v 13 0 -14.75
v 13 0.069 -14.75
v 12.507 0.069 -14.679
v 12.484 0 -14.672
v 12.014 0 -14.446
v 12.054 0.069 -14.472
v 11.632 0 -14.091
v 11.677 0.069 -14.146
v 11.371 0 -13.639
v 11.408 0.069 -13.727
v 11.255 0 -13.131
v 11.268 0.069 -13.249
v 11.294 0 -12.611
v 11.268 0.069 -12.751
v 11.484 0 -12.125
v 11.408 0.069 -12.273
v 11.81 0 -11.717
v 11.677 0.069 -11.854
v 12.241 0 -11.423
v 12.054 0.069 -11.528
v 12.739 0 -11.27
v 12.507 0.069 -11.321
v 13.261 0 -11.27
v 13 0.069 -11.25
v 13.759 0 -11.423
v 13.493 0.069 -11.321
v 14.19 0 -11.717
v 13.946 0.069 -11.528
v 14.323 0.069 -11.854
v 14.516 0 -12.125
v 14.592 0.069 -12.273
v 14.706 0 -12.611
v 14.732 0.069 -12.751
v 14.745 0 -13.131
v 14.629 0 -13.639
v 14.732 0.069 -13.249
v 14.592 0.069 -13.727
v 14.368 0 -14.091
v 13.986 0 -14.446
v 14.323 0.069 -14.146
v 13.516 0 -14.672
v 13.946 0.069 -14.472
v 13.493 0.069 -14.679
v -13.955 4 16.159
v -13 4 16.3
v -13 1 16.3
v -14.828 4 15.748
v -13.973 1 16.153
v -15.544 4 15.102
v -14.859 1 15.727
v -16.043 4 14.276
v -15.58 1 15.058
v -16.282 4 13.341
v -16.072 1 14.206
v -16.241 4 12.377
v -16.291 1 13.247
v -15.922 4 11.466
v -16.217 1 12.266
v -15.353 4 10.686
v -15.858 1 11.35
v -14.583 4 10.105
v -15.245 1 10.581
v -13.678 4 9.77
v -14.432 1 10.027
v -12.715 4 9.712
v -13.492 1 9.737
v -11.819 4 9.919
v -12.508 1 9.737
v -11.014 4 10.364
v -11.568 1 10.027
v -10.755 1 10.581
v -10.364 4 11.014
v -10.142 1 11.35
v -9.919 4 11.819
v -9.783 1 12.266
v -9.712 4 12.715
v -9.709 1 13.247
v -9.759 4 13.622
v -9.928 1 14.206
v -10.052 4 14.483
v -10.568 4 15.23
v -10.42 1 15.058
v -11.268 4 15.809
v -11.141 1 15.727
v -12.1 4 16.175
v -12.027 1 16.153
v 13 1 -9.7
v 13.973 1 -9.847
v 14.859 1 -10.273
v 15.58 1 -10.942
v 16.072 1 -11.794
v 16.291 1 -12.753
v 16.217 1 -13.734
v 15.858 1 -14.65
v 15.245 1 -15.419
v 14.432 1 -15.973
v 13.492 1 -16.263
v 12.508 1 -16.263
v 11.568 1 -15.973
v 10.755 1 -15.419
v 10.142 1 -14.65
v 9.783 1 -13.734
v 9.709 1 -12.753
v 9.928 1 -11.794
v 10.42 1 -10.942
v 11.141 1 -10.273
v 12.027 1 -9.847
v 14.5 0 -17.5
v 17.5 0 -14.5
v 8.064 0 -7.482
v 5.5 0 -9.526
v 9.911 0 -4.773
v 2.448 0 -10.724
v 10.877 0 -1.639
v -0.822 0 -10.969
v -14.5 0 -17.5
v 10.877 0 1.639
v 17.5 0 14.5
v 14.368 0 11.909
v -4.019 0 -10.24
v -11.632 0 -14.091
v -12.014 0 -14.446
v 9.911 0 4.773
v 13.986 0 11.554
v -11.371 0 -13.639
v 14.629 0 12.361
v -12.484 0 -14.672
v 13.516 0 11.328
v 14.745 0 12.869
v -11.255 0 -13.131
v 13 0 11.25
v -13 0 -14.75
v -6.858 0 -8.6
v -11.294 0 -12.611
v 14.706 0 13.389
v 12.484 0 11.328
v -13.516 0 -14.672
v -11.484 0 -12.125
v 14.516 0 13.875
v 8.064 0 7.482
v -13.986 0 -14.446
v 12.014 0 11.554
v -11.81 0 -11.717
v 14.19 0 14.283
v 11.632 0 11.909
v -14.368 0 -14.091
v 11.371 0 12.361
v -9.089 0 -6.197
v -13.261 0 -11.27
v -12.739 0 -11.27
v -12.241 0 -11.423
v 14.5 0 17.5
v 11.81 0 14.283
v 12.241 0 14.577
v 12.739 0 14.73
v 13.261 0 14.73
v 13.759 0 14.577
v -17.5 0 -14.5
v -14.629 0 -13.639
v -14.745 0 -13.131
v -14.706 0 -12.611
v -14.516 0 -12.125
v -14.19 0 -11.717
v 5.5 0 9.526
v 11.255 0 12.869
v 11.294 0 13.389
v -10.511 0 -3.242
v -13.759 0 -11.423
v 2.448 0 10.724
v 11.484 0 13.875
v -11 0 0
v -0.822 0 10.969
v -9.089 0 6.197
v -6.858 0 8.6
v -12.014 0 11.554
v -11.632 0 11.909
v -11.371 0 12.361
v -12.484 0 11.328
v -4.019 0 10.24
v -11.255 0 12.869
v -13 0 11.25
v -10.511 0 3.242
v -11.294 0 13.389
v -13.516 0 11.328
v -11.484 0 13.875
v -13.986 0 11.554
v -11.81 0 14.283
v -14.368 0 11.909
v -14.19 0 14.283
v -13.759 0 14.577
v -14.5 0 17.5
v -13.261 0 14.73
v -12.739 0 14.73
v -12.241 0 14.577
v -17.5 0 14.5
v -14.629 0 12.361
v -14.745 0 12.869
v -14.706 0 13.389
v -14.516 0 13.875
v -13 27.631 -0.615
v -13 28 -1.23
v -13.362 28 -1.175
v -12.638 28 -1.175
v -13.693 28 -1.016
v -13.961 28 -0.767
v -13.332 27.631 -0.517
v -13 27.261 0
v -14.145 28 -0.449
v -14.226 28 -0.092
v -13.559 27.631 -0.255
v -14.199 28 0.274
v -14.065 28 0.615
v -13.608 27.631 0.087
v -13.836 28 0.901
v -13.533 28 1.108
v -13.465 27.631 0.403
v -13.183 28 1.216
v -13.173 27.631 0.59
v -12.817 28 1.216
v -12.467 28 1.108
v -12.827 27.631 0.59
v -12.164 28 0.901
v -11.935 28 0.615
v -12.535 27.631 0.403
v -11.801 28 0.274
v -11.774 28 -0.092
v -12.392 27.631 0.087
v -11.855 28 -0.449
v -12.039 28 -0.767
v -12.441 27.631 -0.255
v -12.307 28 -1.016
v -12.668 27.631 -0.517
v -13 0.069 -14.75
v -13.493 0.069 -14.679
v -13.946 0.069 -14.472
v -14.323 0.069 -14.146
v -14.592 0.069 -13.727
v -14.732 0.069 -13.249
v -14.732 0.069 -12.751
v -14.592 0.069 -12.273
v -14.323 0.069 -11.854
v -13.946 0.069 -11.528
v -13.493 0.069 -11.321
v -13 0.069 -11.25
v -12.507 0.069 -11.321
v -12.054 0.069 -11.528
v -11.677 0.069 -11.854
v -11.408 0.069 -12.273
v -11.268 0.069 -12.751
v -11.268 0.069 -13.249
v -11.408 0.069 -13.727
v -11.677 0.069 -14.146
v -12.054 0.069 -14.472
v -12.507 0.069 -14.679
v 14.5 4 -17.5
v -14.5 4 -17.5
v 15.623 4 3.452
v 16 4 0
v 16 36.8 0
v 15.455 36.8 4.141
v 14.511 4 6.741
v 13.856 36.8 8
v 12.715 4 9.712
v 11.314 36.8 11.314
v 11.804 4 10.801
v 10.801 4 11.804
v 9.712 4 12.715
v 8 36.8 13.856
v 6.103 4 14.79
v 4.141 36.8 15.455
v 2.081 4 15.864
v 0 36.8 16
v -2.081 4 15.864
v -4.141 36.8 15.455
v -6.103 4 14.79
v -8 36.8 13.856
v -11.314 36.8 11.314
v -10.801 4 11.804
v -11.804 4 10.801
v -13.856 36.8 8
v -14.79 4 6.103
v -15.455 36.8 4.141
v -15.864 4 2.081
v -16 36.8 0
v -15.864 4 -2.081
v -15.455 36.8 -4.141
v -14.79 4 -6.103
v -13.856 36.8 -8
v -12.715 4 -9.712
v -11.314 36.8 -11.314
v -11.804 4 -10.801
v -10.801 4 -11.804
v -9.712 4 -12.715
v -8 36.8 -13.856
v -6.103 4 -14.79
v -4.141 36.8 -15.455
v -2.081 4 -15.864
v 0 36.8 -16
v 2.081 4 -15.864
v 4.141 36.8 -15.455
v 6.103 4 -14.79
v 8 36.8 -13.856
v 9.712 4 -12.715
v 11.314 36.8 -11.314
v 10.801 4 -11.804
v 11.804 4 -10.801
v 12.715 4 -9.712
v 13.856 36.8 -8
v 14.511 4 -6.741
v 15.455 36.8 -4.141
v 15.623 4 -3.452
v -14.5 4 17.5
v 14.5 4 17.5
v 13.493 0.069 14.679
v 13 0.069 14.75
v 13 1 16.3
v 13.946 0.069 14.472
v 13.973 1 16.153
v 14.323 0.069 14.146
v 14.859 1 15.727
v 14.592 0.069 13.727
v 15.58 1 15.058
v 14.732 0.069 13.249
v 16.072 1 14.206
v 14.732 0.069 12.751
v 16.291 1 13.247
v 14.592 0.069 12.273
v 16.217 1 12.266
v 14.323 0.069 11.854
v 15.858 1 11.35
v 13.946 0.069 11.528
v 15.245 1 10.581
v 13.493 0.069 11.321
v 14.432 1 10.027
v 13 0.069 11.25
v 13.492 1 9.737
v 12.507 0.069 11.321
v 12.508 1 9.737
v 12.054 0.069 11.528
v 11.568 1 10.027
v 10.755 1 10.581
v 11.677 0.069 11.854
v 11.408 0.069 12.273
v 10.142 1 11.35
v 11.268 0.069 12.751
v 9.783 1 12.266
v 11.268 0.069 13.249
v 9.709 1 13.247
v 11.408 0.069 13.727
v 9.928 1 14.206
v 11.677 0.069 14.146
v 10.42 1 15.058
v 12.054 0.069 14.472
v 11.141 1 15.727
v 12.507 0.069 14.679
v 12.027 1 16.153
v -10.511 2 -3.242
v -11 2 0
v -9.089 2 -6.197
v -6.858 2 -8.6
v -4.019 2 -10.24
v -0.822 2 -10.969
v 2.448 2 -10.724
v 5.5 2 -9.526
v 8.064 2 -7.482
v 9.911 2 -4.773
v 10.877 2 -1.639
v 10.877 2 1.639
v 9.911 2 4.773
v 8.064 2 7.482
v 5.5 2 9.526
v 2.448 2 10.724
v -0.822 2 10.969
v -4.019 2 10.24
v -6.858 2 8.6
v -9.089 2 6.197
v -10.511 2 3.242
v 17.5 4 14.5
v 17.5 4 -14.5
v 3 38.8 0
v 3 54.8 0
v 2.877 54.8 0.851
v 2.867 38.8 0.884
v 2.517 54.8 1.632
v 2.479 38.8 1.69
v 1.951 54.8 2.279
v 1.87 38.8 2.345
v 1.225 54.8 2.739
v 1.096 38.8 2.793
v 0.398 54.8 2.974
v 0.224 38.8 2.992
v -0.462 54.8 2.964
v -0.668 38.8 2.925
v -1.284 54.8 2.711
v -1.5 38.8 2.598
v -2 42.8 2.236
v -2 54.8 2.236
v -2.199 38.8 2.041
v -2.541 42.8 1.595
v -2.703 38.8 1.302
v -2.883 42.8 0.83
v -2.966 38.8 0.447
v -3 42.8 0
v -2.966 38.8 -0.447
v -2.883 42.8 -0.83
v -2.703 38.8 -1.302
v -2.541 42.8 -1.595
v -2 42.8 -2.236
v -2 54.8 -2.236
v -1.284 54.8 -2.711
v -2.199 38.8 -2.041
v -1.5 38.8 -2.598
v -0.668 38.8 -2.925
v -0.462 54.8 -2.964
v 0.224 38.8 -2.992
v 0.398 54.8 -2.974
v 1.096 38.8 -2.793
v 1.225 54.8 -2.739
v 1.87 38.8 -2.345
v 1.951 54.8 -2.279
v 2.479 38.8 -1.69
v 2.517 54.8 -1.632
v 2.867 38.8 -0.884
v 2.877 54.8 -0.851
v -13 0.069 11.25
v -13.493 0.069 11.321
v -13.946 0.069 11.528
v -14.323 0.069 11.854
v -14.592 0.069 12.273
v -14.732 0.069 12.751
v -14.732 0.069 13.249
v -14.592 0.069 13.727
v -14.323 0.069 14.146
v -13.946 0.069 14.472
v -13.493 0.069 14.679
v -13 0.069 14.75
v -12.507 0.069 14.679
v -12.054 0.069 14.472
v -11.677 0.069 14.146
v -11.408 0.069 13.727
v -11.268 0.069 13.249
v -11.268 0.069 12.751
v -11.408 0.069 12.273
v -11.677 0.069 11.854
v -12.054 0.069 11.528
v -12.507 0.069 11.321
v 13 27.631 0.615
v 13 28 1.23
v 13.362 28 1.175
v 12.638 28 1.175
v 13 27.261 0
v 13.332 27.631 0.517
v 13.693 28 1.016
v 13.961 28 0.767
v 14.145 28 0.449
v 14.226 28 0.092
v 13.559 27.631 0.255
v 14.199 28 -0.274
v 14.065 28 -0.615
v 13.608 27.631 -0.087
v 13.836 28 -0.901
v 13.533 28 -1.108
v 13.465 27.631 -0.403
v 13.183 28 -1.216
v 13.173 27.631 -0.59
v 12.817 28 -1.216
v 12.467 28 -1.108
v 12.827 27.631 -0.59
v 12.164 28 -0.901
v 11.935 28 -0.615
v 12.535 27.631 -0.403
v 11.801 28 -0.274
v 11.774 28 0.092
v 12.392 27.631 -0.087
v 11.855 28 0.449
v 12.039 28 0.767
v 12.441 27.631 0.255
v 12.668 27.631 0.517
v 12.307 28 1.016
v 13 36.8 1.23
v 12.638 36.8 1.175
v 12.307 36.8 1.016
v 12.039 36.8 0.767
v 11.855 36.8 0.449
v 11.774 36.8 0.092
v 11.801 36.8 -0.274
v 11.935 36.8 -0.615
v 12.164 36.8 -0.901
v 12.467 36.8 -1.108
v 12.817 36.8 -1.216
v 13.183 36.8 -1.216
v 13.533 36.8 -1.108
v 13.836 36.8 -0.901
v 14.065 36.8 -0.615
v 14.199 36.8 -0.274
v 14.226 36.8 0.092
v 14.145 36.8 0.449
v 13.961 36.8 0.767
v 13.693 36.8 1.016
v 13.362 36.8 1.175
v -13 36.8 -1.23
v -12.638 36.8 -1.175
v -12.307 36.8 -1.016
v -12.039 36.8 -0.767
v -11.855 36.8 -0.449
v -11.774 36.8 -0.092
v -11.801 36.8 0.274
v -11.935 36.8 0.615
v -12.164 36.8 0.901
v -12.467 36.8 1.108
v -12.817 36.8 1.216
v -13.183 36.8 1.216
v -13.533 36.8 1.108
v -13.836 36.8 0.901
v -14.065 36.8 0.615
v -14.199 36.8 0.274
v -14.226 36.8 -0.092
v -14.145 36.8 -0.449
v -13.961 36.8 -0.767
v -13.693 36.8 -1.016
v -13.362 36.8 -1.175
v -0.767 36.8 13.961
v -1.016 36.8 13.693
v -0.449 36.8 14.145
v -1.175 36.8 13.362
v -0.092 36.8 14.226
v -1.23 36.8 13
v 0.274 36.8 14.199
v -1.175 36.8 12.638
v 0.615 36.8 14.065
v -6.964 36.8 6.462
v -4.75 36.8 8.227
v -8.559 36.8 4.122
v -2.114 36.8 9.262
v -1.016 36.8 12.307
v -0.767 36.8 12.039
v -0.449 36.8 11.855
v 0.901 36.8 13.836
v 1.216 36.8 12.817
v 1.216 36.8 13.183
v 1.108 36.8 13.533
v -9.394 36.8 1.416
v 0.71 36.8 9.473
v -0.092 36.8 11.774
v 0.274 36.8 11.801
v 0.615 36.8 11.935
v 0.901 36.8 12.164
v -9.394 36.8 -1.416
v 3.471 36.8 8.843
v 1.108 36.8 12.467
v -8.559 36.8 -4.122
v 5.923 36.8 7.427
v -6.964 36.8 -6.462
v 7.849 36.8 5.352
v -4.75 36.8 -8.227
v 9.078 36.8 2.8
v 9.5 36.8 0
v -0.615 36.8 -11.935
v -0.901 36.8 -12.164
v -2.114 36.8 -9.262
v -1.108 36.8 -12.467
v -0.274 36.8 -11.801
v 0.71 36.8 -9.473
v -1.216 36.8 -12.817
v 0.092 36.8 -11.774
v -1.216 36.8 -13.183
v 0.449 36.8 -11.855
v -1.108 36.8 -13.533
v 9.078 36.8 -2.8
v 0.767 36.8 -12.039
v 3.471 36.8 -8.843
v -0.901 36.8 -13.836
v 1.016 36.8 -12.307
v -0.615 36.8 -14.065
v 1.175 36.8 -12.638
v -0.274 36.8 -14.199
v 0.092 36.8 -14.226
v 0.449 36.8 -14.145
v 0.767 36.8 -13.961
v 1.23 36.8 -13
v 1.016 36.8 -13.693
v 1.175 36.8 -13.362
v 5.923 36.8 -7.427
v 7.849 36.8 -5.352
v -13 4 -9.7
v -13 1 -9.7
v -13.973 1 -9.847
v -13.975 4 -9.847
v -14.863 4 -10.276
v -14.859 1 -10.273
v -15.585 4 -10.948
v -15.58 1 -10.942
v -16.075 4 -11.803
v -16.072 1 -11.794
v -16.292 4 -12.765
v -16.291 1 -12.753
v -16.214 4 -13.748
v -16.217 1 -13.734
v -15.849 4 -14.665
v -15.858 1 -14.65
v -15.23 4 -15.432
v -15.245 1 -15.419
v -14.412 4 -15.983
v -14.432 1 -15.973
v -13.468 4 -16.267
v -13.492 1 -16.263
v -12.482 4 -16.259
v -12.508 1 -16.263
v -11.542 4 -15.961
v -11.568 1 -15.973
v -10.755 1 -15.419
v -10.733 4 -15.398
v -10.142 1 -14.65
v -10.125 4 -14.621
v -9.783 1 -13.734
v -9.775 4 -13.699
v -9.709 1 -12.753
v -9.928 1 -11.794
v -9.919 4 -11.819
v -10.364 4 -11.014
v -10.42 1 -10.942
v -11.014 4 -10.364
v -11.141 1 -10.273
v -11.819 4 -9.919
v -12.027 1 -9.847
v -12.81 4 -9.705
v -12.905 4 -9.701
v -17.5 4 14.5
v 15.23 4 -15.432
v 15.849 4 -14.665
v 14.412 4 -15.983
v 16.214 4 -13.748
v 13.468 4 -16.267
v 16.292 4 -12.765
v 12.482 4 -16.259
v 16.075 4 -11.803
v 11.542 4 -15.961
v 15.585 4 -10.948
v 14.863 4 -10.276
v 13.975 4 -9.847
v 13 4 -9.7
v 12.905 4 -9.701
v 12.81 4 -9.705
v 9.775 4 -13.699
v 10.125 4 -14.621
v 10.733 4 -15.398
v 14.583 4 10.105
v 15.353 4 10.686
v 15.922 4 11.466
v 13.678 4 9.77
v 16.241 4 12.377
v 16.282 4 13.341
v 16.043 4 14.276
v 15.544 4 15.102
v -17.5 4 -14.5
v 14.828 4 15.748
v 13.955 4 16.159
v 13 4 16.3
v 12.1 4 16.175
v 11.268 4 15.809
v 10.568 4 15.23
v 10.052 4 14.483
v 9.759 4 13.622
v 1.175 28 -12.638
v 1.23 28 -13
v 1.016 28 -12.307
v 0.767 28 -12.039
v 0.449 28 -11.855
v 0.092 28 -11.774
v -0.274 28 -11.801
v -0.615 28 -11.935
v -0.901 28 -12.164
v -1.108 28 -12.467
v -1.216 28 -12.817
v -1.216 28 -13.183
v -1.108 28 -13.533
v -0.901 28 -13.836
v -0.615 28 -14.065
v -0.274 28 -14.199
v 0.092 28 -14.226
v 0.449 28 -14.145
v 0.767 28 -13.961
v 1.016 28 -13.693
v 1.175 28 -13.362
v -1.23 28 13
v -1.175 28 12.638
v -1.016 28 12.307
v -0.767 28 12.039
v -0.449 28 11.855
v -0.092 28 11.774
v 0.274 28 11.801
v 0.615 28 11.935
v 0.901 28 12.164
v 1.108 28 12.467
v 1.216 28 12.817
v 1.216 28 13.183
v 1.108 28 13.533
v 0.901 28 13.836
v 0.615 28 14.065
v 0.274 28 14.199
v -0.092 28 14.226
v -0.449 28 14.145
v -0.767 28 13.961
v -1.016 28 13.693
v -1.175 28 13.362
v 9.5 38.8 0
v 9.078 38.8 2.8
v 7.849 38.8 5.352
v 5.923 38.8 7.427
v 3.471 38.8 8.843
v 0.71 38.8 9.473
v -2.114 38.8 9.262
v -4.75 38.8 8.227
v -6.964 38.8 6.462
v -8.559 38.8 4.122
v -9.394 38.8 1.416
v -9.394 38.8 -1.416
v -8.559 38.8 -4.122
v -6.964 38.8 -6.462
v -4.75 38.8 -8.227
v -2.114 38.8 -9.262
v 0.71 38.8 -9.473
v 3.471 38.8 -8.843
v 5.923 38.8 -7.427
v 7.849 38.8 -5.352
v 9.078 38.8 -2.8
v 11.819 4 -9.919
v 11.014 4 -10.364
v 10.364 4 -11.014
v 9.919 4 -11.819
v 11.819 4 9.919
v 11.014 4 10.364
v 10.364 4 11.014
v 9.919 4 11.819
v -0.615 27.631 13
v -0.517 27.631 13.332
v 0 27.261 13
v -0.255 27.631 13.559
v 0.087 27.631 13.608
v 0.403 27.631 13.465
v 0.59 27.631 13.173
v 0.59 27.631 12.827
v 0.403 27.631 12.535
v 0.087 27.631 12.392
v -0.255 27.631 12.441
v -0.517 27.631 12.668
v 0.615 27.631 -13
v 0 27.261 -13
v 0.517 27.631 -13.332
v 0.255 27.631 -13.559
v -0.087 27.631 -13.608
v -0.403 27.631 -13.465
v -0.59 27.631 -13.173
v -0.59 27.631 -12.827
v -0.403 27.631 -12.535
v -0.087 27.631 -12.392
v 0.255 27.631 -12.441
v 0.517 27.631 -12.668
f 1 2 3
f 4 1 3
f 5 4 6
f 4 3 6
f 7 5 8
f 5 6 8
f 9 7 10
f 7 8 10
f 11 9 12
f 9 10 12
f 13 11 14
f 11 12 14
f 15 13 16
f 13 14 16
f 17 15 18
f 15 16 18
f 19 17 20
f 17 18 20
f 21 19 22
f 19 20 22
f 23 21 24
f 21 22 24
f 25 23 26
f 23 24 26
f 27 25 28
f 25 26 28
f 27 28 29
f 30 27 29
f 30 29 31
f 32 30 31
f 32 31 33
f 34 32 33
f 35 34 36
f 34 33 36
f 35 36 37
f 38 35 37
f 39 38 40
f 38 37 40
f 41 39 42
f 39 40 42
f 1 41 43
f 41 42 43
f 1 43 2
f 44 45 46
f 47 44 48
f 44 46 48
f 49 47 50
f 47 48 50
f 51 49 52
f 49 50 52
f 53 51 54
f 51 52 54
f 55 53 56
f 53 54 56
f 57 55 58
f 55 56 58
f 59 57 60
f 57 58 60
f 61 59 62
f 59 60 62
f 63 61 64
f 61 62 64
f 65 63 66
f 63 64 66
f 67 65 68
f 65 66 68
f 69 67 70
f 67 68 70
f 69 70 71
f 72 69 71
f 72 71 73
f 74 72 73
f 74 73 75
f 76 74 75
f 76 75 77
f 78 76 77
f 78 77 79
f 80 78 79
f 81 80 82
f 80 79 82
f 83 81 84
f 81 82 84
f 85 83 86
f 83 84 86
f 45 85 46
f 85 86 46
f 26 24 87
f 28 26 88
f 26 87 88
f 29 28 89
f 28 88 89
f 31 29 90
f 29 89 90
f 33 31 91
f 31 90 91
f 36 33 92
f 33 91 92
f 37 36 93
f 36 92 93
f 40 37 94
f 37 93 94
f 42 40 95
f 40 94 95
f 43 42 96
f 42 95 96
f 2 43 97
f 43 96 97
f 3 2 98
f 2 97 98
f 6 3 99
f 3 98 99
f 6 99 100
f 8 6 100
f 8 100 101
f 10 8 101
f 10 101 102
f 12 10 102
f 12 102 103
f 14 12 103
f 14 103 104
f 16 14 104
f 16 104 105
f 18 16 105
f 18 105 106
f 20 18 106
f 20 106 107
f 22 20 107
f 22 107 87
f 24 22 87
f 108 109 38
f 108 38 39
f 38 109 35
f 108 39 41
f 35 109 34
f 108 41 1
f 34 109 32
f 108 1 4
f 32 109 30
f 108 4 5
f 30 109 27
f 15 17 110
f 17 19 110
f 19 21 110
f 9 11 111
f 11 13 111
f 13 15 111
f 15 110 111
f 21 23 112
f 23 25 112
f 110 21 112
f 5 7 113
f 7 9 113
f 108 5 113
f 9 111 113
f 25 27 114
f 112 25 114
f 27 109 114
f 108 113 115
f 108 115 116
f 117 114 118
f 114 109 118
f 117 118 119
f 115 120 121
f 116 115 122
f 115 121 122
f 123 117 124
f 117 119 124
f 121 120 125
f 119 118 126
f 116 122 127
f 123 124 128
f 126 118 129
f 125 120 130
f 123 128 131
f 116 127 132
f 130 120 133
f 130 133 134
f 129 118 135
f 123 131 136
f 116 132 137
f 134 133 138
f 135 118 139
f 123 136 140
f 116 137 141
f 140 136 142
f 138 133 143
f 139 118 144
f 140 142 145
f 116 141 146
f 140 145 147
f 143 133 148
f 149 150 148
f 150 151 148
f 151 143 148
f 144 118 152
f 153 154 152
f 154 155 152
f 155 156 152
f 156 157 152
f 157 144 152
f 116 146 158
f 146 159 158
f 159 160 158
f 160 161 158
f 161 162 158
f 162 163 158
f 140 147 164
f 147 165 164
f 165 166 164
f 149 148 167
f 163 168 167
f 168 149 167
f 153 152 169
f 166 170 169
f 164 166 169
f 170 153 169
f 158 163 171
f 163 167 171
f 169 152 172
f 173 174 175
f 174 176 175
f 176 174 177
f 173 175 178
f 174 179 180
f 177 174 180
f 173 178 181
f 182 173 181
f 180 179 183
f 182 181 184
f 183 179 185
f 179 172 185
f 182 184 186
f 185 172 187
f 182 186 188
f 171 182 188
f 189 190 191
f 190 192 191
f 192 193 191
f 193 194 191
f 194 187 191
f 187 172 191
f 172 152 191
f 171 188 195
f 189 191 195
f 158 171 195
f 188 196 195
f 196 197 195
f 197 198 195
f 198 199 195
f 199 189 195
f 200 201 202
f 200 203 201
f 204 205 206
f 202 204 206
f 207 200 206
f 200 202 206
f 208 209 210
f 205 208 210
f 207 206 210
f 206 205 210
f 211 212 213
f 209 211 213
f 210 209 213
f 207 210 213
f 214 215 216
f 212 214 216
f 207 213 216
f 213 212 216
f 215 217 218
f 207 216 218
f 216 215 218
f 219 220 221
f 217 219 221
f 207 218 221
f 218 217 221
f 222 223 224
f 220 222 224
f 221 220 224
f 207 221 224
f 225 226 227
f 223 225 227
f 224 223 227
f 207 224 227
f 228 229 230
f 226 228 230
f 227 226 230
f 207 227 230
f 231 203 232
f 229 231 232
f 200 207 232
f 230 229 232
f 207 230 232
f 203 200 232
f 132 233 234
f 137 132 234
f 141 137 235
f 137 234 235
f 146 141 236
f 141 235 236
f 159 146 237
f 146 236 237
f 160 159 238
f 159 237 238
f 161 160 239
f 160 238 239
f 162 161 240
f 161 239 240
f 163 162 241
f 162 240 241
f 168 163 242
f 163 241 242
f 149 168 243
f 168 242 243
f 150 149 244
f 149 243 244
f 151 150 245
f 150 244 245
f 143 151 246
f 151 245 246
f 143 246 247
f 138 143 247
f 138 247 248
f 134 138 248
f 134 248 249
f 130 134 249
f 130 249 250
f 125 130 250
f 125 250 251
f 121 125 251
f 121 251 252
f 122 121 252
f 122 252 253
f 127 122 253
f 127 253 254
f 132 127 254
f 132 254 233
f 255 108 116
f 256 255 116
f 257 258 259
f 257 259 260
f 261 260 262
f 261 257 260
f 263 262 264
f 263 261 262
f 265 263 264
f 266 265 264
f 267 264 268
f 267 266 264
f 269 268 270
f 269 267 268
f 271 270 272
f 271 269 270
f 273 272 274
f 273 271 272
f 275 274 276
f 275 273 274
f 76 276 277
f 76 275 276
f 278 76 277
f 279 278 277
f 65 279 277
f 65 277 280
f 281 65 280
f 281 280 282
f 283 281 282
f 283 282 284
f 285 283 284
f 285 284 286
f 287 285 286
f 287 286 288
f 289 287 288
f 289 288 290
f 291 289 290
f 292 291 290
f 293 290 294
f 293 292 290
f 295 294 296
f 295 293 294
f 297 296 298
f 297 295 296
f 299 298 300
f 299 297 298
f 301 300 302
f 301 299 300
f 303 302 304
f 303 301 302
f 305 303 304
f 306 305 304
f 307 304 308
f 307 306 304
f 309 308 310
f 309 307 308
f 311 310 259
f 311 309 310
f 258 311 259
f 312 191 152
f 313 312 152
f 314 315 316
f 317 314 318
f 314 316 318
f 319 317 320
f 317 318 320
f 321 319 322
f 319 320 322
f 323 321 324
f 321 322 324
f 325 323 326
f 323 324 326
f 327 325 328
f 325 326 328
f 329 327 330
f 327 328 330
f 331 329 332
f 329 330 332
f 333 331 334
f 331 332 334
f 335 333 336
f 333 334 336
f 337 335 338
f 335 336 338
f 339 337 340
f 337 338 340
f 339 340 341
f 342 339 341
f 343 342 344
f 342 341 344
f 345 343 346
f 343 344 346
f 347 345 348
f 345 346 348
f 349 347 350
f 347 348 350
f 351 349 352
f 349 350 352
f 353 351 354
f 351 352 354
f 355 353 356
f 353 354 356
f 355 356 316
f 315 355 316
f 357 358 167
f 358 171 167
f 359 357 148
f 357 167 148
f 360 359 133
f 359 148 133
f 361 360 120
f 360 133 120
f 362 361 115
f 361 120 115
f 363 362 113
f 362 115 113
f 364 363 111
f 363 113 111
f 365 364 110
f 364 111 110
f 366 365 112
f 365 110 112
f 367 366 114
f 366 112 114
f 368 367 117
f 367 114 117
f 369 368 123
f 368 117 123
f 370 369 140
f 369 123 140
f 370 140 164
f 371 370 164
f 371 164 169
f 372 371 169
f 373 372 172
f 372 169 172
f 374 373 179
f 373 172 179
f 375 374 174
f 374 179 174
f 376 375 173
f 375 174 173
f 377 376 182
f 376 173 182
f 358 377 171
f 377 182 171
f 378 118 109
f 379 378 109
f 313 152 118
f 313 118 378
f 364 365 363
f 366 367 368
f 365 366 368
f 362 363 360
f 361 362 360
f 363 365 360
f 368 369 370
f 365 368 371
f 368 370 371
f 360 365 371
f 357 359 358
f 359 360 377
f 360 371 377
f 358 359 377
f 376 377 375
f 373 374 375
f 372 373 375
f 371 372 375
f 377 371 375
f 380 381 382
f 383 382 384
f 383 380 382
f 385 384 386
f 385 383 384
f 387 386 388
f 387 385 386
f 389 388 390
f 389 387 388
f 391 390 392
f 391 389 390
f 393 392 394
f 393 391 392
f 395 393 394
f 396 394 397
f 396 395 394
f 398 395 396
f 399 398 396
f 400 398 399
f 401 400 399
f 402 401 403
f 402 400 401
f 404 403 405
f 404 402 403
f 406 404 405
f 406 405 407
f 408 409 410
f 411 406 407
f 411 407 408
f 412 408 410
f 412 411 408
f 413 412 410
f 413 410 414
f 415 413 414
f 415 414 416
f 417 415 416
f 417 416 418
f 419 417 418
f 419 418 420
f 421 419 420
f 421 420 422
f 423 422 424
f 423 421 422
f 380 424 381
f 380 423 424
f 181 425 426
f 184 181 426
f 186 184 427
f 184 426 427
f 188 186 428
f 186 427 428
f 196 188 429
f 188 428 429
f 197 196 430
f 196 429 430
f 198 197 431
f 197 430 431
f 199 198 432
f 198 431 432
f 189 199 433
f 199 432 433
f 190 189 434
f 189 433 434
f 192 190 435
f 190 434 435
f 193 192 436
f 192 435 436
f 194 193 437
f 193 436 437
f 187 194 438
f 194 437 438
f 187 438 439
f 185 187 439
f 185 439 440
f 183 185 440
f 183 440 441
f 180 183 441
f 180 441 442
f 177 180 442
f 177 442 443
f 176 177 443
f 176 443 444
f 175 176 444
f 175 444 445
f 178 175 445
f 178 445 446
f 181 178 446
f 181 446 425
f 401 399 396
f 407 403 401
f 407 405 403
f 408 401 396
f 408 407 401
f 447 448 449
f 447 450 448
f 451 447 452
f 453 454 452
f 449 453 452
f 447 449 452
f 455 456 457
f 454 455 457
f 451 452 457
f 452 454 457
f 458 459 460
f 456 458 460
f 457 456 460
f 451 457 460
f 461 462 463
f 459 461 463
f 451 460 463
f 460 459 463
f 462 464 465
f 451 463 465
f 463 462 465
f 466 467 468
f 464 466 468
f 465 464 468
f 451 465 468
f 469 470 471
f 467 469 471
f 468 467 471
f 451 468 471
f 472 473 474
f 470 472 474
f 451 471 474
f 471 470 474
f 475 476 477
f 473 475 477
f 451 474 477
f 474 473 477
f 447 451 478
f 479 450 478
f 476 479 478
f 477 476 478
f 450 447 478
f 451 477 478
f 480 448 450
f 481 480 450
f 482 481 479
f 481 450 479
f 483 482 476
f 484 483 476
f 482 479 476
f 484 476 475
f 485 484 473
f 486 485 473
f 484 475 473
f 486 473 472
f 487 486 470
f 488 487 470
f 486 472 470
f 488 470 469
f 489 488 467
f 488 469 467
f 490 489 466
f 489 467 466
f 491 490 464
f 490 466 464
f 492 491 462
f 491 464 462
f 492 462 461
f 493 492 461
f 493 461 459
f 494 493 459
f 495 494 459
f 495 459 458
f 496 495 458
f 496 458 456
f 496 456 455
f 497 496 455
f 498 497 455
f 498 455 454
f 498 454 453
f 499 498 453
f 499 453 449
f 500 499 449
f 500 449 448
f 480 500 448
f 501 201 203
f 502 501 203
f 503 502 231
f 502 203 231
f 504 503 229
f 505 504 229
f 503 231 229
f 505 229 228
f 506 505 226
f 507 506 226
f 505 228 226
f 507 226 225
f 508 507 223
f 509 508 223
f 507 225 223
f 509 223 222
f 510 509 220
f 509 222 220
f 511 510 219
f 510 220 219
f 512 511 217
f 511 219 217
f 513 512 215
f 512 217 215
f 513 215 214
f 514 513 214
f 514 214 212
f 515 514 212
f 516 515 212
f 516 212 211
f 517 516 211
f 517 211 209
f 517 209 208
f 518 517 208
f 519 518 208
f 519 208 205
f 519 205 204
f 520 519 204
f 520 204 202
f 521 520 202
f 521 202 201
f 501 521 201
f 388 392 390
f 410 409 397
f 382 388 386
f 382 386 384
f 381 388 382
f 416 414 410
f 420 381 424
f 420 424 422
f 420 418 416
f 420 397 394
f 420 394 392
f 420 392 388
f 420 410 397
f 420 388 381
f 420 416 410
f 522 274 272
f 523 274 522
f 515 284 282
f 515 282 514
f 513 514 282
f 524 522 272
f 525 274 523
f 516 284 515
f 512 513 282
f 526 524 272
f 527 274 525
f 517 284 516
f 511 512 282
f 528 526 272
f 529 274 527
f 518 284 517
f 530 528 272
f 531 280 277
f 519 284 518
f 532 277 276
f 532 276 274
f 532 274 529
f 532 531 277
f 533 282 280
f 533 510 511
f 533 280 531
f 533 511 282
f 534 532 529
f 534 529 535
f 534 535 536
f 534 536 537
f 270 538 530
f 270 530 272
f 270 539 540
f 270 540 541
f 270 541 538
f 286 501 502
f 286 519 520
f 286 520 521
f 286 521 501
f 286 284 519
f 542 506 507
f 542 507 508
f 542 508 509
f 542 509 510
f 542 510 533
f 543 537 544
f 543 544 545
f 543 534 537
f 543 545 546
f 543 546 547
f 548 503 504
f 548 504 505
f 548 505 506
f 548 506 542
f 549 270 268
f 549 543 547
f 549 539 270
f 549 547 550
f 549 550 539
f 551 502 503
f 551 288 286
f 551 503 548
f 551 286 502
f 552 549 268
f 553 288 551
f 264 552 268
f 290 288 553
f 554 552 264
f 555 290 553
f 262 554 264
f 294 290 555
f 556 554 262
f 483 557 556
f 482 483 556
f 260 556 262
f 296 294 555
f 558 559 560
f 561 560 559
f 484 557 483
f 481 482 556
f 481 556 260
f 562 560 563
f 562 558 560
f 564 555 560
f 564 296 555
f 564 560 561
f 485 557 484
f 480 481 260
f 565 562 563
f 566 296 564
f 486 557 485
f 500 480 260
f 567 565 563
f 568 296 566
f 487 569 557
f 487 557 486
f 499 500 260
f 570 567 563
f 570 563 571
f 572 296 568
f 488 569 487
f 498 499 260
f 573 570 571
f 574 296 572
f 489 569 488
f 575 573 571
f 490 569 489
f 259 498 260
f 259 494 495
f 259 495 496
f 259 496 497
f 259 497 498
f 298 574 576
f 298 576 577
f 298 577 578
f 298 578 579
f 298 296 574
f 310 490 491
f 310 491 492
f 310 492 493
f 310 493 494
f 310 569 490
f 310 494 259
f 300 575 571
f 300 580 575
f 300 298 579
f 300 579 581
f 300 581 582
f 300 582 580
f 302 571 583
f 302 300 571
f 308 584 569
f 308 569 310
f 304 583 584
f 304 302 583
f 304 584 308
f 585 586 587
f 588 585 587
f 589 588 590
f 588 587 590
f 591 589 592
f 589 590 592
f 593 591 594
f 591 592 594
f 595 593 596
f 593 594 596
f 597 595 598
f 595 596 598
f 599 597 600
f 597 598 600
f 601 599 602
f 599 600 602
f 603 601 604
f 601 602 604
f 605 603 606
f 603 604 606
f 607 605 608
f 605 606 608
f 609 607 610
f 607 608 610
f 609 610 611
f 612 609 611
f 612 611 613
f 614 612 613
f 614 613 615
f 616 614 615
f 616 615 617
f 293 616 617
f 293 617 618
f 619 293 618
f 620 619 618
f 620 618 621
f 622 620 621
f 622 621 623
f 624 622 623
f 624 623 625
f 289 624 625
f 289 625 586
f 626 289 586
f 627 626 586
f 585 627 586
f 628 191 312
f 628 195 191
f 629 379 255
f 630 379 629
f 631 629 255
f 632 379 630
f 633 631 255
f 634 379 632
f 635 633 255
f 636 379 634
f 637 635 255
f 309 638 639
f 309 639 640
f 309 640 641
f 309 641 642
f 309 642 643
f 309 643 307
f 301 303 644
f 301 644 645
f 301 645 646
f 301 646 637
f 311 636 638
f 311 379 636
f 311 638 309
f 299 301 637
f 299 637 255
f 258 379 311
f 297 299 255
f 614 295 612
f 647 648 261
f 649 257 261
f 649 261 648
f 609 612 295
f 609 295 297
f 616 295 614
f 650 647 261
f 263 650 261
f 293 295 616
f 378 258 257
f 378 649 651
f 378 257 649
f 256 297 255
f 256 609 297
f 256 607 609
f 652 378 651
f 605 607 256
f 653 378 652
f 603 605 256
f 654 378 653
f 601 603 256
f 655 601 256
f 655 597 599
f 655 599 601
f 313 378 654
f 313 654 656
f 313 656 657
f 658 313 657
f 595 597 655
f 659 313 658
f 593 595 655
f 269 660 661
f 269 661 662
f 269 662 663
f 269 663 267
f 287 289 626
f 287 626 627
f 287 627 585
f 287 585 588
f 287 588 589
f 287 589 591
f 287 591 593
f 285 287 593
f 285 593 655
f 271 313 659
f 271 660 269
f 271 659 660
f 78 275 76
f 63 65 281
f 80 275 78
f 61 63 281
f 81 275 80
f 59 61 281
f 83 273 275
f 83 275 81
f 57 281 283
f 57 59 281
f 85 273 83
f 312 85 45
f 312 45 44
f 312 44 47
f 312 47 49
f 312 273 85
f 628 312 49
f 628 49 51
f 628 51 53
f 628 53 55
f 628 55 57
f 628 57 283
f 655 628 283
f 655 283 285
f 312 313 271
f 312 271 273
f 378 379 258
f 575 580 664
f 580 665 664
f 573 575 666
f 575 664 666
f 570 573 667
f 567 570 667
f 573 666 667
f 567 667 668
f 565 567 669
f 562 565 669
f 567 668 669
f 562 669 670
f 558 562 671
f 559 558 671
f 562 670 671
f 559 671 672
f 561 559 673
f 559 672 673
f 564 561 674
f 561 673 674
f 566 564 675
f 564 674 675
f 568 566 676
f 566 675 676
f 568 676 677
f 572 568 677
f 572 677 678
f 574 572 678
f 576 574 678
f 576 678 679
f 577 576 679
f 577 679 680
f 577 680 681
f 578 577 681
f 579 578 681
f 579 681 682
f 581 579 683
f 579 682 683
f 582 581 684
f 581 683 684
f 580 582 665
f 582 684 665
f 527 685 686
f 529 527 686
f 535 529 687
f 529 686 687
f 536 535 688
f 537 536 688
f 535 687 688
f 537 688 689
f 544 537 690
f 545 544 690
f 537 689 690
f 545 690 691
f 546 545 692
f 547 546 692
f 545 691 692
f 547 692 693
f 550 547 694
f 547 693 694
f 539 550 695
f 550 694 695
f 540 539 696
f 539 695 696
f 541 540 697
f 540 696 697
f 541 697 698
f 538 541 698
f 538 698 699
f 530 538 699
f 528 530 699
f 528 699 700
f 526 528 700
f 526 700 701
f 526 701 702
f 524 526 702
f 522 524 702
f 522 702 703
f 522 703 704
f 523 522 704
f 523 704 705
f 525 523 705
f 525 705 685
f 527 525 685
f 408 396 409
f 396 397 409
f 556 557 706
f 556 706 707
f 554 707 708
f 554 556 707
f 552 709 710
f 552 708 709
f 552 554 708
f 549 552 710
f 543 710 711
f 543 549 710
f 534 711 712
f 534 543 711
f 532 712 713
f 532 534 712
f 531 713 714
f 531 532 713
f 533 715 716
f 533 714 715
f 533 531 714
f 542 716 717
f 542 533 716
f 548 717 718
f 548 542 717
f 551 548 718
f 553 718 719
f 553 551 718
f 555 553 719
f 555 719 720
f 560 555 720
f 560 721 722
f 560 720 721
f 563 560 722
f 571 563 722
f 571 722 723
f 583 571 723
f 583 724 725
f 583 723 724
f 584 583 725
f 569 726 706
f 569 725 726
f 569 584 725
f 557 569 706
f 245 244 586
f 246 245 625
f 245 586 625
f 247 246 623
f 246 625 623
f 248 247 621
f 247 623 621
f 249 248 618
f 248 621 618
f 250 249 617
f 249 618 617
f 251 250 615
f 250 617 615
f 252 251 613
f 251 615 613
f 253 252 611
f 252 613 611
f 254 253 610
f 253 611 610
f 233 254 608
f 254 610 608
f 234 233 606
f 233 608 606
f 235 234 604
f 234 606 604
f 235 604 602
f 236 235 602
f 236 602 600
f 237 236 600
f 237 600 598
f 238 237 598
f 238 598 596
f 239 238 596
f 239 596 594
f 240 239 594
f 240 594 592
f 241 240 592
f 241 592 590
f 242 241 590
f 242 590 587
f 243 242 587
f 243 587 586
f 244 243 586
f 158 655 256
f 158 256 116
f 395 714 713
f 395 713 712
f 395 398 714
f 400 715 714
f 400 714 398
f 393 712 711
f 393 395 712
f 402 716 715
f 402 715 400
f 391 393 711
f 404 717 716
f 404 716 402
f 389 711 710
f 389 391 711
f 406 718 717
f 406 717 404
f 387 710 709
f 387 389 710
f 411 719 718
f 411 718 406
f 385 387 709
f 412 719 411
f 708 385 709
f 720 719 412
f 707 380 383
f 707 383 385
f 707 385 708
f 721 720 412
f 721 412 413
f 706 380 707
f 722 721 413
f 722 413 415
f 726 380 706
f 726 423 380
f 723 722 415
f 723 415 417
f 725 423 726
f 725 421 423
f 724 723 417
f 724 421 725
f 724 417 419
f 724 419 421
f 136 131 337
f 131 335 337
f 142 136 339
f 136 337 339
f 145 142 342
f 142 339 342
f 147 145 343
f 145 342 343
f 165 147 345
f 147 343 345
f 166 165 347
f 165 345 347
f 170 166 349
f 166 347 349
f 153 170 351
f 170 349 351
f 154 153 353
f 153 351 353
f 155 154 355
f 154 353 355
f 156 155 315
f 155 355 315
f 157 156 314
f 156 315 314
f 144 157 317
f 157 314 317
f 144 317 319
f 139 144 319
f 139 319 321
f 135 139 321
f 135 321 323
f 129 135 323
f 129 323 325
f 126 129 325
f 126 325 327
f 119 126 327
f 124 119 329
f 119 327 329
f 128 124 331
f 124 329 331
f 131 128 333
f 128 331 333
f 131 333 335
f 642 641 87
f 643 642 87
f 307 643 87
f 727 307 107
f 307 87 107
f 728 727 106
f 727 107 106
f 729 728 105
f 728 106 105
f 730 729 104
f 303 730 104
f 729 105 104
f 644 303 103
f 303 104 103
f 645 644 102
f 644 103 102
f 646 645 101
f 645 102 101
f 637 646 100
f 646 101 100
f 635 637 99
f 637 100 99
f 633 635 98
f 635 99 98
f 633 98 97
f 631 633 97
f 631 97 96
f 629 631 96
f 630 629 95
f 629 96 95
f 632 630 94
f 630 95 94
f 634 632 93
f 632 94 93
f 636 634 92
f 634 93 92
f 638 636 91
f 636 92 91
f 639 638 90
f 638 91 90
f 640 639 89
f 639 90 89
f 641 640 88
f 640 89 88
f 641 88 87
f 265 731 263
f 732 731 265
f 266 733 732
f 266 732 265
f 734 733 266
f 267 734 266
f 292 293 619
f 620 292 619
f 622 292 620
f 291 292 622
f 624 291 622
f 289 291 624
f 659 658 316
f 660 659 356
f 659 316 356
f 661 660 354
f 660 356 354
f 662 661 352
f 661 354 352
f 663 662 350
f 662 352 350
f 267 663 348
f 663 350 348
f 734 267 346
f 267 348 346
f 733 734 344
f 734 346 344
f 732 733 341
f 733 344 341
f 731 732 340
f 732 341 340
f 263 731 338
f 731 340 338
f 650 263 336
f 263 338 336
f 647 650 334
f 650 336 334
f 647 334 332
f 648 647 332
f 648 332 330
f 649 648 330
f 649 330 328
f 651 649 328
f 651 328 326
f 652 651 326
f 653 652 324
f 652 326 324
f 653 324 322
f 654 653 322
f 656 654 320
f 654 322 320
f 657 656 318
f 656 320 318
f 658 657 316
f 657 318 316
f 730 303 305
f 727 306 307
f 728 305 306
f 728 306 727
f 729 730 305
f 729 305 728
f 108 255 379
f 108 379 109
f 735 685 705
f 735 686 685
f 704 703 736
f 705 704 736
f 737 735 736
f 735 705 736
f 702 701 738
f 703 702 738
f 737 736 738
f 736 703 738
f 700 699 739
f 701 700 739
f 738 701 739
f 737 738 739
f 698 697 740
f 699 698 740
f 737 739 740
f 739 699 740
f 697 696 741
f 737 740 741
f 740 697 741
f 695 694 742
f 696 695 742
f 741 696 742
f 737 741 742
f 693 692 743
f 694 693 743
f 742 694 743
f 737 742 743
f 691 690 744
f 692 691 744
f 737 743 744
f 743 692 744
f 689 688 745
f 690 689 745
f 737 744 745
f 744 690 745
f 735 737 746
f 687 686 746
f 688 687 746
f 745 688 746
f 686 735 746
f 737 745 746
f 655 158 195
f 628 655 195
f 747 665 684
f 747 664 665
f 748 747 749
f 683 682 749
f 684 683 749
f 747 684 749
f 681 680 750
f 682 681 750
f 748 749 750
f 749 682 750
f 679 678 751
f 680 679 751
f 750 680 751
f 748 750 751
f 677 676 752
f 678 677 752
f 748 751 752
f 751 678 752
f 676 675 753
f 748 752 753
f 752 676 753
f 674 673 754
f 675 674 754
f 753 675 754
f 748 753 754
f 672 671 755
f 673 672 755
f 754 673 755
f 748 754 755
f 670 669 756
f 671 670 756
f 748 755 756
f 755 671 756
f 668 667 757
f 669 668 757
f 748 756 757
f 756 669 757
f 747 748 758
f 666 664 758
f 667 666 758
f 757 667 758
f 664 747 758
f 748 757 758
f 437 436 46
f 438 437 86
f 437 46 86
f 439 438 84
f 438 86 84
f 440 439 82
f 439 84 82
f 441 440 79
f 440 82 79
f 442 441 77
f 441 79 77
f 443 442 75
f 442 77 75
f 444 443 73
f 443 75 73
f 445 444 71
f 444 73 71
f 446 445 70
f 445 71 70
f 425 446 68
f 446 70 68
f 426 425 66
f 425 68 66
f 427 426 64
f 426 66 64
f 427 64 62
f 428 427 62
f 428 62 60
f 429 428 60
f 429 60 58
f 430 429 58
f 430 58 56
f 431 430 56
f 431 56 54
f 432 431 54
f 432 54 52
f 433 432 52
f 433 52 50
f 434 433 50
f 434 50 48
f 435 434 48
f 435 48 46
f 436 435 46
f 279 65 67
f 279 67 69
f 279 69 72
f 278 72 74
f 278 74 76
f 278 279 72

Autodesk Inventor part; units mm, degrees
ref_plane "YZ Plane" through (0, 0, 0) normal (1, 0, 0) x (0, 1, 0)
ref_plane "XZ Plane" through (0, 0, 0) normal (0, 1, 0) x (-1, 0, 0)
ref_plane "XY Plane" through (0, 0, 0) normal (0, 0, 1) x (1, 0, 0)
sketch "Sketch1" plane through (0, 0, 0) normal (0, 1, 0) x (-1, 0, 0)
  line L0 (-17.5, -17.5) -> (17.5, -17.5)
  line L1 (17.5, -17.5) -> (17.5, 17.5)
  line L2 (17.5, 17.5) -> (-17.5, 17.5)
  line L3 (-17.5, 17.5) -> (-17.5, -17.5)
  line L4 (-17.5, -17.5) -> (17.5, 17.5) construction
  line L5 (17.5, -17.5) -> (-17.5, 17.5) construction
  point P0 (0, 0)
  dimension "d0" = 35
extrude "Extrusion1" add sketch "Sketch1" along normal blind 4
sketch "Sketch2" plane through (0, 0, 0) normal (0, 1, 0) x (1, 0, 0)
  circle A0 centre (0, 0) radius 16
  dimension "d3" = 32
extrude "Extrusion2" add sketch "Sketch2" along normal blind 36.8
sketch "Sketch3" plane through (0, 36.8, 0) normal (0, 1, 0) x (1, 0, 0)
  circle A0 centre (0, 0) radius 9.5
  dimension "d6" = 19
extrude "Extrusion3" add sketch "Sketch3" along normal blind 2
sketch "Sketch4" plane through (0, 36.8, 0) normal (0, 1, 0) x (1, 0, 0)
  circle A0 centre (0, 0) radius 3
  dimension "d9" = 6
extrude "Extrusion4" add sketch "Sketch4" along normal blind 18
sketch "Sketch5" plane through (0, 36.8, 0) normal (0, 1, 0) x (1, 0, 0)
  line L0 (24.5, 0) -> (-24.5, 0) projected
  line L1 (0, 24.5) -> (0, -24.5) projected
  point P0 (13, 0)
  dimension "d49" = 13
hole "Hole1" at (13, 36.8, 0) direction (0, -1, 0) diameter 2.459 depth 8.8 tip angle 118 thread size "M3x0.5" class "6H" standard "ISO Metric profile"
pattern_circular "Circular Pattern1" count 4 over 360 about axis through (0, -10, 0) along (0, 1, 0) of "Hole1"
chamfer "Chamfer1" distance 3 angle 45 4 edges at (17.5, 2, -17.5) (-17.5, 2, -17.5) (17.5, 2, 17.5) (-17.5, 2, 17.5)
sketch "Sketch7" plane through (0, 0, 0) normal (0, 1, 0) x (-1, 0, 0)
  circle A0 centre (0, 0) radius 11
  dimension "d30" = 22
extrude "Extrusion5" cut sketch "Sketch7" along normal blind 2
sketch "Sketch8" plane through (0, 0, 0) normal (0, 1, 0) x (-1, 0, 0)
  line L0 (13, 13) -> (-13, 13)
  line L1 (-13, 13) -> (-13, -13)
  line L2 (-13, -13) -> (13, -13)
  line L3 (13, -13) -> (13, 13)
  line L4 (13, 13) -> (-13, -13) construction
  line L5 (-13, 13) -> (13, -13) construction
  point P0 (0, 0)
  dimension "d33" = 26
hole "Hole3" at (13, 0, 13) at (-13, 0, 13) at (-13, 0, -13) at (13, 0, -13) direction (0, 1, 0) diameter 3.5 depth 4
sketch "Sketch9" plane through (0, 4, 0) normal (0, 1, 0) x (1, 0, 0)
  circle A0 centre (-13, -13) radius 1.75 projected
  circle A1 centre (-13, 13) radius 1.75 projected
  circle A2 centre (13, 13) radius 1.75 projected
  circle A3 centre (13, -13) radius 1.75 projected
  point P0 (0, 0)
  point P1 (-13.6978, -15.9176)
  point P2 (-15.9176, -13.6978)
  point P3 (13.6978, 15.9176)
  point P4 (15.9176, 13.6978)
  point P5 (14.7912, 17.2088)
  point P6 (-14.7912, -17.2088)
  point P7 (-17.2088, -14.7912)
  point P8 (17.2088, 14.7912)
hole "Hole4" at (-13, 4, 13) at (-13, 4, -13) at (13, 4, -13) at (13, 4, 13) direction (0, -1, 0) diameter 6.6 depth 3 tip angle 118
sketch "Sketch10" plane through (0, 54.8, 0) normal (0, 1, 0) x (1, 0, 0)
  line L0 (-4.6716, -4.4668) -> (-2, -4.4668)
  line L1 (-2, -4.4668) -> (-2, 4.6167)
  line L2 (-2, 4.6167) -> (-4.6716, 4.6167)
  line L3 (-4.6716, 4.6167) -> (-4.6716, -4.4668)
  point P0 (0, 0)
  dimension "d53" = 2
extrude "Extrusion6" cut sketch "Sketch10" against normal blind 12
properties part number "911-42-reducer-long"
